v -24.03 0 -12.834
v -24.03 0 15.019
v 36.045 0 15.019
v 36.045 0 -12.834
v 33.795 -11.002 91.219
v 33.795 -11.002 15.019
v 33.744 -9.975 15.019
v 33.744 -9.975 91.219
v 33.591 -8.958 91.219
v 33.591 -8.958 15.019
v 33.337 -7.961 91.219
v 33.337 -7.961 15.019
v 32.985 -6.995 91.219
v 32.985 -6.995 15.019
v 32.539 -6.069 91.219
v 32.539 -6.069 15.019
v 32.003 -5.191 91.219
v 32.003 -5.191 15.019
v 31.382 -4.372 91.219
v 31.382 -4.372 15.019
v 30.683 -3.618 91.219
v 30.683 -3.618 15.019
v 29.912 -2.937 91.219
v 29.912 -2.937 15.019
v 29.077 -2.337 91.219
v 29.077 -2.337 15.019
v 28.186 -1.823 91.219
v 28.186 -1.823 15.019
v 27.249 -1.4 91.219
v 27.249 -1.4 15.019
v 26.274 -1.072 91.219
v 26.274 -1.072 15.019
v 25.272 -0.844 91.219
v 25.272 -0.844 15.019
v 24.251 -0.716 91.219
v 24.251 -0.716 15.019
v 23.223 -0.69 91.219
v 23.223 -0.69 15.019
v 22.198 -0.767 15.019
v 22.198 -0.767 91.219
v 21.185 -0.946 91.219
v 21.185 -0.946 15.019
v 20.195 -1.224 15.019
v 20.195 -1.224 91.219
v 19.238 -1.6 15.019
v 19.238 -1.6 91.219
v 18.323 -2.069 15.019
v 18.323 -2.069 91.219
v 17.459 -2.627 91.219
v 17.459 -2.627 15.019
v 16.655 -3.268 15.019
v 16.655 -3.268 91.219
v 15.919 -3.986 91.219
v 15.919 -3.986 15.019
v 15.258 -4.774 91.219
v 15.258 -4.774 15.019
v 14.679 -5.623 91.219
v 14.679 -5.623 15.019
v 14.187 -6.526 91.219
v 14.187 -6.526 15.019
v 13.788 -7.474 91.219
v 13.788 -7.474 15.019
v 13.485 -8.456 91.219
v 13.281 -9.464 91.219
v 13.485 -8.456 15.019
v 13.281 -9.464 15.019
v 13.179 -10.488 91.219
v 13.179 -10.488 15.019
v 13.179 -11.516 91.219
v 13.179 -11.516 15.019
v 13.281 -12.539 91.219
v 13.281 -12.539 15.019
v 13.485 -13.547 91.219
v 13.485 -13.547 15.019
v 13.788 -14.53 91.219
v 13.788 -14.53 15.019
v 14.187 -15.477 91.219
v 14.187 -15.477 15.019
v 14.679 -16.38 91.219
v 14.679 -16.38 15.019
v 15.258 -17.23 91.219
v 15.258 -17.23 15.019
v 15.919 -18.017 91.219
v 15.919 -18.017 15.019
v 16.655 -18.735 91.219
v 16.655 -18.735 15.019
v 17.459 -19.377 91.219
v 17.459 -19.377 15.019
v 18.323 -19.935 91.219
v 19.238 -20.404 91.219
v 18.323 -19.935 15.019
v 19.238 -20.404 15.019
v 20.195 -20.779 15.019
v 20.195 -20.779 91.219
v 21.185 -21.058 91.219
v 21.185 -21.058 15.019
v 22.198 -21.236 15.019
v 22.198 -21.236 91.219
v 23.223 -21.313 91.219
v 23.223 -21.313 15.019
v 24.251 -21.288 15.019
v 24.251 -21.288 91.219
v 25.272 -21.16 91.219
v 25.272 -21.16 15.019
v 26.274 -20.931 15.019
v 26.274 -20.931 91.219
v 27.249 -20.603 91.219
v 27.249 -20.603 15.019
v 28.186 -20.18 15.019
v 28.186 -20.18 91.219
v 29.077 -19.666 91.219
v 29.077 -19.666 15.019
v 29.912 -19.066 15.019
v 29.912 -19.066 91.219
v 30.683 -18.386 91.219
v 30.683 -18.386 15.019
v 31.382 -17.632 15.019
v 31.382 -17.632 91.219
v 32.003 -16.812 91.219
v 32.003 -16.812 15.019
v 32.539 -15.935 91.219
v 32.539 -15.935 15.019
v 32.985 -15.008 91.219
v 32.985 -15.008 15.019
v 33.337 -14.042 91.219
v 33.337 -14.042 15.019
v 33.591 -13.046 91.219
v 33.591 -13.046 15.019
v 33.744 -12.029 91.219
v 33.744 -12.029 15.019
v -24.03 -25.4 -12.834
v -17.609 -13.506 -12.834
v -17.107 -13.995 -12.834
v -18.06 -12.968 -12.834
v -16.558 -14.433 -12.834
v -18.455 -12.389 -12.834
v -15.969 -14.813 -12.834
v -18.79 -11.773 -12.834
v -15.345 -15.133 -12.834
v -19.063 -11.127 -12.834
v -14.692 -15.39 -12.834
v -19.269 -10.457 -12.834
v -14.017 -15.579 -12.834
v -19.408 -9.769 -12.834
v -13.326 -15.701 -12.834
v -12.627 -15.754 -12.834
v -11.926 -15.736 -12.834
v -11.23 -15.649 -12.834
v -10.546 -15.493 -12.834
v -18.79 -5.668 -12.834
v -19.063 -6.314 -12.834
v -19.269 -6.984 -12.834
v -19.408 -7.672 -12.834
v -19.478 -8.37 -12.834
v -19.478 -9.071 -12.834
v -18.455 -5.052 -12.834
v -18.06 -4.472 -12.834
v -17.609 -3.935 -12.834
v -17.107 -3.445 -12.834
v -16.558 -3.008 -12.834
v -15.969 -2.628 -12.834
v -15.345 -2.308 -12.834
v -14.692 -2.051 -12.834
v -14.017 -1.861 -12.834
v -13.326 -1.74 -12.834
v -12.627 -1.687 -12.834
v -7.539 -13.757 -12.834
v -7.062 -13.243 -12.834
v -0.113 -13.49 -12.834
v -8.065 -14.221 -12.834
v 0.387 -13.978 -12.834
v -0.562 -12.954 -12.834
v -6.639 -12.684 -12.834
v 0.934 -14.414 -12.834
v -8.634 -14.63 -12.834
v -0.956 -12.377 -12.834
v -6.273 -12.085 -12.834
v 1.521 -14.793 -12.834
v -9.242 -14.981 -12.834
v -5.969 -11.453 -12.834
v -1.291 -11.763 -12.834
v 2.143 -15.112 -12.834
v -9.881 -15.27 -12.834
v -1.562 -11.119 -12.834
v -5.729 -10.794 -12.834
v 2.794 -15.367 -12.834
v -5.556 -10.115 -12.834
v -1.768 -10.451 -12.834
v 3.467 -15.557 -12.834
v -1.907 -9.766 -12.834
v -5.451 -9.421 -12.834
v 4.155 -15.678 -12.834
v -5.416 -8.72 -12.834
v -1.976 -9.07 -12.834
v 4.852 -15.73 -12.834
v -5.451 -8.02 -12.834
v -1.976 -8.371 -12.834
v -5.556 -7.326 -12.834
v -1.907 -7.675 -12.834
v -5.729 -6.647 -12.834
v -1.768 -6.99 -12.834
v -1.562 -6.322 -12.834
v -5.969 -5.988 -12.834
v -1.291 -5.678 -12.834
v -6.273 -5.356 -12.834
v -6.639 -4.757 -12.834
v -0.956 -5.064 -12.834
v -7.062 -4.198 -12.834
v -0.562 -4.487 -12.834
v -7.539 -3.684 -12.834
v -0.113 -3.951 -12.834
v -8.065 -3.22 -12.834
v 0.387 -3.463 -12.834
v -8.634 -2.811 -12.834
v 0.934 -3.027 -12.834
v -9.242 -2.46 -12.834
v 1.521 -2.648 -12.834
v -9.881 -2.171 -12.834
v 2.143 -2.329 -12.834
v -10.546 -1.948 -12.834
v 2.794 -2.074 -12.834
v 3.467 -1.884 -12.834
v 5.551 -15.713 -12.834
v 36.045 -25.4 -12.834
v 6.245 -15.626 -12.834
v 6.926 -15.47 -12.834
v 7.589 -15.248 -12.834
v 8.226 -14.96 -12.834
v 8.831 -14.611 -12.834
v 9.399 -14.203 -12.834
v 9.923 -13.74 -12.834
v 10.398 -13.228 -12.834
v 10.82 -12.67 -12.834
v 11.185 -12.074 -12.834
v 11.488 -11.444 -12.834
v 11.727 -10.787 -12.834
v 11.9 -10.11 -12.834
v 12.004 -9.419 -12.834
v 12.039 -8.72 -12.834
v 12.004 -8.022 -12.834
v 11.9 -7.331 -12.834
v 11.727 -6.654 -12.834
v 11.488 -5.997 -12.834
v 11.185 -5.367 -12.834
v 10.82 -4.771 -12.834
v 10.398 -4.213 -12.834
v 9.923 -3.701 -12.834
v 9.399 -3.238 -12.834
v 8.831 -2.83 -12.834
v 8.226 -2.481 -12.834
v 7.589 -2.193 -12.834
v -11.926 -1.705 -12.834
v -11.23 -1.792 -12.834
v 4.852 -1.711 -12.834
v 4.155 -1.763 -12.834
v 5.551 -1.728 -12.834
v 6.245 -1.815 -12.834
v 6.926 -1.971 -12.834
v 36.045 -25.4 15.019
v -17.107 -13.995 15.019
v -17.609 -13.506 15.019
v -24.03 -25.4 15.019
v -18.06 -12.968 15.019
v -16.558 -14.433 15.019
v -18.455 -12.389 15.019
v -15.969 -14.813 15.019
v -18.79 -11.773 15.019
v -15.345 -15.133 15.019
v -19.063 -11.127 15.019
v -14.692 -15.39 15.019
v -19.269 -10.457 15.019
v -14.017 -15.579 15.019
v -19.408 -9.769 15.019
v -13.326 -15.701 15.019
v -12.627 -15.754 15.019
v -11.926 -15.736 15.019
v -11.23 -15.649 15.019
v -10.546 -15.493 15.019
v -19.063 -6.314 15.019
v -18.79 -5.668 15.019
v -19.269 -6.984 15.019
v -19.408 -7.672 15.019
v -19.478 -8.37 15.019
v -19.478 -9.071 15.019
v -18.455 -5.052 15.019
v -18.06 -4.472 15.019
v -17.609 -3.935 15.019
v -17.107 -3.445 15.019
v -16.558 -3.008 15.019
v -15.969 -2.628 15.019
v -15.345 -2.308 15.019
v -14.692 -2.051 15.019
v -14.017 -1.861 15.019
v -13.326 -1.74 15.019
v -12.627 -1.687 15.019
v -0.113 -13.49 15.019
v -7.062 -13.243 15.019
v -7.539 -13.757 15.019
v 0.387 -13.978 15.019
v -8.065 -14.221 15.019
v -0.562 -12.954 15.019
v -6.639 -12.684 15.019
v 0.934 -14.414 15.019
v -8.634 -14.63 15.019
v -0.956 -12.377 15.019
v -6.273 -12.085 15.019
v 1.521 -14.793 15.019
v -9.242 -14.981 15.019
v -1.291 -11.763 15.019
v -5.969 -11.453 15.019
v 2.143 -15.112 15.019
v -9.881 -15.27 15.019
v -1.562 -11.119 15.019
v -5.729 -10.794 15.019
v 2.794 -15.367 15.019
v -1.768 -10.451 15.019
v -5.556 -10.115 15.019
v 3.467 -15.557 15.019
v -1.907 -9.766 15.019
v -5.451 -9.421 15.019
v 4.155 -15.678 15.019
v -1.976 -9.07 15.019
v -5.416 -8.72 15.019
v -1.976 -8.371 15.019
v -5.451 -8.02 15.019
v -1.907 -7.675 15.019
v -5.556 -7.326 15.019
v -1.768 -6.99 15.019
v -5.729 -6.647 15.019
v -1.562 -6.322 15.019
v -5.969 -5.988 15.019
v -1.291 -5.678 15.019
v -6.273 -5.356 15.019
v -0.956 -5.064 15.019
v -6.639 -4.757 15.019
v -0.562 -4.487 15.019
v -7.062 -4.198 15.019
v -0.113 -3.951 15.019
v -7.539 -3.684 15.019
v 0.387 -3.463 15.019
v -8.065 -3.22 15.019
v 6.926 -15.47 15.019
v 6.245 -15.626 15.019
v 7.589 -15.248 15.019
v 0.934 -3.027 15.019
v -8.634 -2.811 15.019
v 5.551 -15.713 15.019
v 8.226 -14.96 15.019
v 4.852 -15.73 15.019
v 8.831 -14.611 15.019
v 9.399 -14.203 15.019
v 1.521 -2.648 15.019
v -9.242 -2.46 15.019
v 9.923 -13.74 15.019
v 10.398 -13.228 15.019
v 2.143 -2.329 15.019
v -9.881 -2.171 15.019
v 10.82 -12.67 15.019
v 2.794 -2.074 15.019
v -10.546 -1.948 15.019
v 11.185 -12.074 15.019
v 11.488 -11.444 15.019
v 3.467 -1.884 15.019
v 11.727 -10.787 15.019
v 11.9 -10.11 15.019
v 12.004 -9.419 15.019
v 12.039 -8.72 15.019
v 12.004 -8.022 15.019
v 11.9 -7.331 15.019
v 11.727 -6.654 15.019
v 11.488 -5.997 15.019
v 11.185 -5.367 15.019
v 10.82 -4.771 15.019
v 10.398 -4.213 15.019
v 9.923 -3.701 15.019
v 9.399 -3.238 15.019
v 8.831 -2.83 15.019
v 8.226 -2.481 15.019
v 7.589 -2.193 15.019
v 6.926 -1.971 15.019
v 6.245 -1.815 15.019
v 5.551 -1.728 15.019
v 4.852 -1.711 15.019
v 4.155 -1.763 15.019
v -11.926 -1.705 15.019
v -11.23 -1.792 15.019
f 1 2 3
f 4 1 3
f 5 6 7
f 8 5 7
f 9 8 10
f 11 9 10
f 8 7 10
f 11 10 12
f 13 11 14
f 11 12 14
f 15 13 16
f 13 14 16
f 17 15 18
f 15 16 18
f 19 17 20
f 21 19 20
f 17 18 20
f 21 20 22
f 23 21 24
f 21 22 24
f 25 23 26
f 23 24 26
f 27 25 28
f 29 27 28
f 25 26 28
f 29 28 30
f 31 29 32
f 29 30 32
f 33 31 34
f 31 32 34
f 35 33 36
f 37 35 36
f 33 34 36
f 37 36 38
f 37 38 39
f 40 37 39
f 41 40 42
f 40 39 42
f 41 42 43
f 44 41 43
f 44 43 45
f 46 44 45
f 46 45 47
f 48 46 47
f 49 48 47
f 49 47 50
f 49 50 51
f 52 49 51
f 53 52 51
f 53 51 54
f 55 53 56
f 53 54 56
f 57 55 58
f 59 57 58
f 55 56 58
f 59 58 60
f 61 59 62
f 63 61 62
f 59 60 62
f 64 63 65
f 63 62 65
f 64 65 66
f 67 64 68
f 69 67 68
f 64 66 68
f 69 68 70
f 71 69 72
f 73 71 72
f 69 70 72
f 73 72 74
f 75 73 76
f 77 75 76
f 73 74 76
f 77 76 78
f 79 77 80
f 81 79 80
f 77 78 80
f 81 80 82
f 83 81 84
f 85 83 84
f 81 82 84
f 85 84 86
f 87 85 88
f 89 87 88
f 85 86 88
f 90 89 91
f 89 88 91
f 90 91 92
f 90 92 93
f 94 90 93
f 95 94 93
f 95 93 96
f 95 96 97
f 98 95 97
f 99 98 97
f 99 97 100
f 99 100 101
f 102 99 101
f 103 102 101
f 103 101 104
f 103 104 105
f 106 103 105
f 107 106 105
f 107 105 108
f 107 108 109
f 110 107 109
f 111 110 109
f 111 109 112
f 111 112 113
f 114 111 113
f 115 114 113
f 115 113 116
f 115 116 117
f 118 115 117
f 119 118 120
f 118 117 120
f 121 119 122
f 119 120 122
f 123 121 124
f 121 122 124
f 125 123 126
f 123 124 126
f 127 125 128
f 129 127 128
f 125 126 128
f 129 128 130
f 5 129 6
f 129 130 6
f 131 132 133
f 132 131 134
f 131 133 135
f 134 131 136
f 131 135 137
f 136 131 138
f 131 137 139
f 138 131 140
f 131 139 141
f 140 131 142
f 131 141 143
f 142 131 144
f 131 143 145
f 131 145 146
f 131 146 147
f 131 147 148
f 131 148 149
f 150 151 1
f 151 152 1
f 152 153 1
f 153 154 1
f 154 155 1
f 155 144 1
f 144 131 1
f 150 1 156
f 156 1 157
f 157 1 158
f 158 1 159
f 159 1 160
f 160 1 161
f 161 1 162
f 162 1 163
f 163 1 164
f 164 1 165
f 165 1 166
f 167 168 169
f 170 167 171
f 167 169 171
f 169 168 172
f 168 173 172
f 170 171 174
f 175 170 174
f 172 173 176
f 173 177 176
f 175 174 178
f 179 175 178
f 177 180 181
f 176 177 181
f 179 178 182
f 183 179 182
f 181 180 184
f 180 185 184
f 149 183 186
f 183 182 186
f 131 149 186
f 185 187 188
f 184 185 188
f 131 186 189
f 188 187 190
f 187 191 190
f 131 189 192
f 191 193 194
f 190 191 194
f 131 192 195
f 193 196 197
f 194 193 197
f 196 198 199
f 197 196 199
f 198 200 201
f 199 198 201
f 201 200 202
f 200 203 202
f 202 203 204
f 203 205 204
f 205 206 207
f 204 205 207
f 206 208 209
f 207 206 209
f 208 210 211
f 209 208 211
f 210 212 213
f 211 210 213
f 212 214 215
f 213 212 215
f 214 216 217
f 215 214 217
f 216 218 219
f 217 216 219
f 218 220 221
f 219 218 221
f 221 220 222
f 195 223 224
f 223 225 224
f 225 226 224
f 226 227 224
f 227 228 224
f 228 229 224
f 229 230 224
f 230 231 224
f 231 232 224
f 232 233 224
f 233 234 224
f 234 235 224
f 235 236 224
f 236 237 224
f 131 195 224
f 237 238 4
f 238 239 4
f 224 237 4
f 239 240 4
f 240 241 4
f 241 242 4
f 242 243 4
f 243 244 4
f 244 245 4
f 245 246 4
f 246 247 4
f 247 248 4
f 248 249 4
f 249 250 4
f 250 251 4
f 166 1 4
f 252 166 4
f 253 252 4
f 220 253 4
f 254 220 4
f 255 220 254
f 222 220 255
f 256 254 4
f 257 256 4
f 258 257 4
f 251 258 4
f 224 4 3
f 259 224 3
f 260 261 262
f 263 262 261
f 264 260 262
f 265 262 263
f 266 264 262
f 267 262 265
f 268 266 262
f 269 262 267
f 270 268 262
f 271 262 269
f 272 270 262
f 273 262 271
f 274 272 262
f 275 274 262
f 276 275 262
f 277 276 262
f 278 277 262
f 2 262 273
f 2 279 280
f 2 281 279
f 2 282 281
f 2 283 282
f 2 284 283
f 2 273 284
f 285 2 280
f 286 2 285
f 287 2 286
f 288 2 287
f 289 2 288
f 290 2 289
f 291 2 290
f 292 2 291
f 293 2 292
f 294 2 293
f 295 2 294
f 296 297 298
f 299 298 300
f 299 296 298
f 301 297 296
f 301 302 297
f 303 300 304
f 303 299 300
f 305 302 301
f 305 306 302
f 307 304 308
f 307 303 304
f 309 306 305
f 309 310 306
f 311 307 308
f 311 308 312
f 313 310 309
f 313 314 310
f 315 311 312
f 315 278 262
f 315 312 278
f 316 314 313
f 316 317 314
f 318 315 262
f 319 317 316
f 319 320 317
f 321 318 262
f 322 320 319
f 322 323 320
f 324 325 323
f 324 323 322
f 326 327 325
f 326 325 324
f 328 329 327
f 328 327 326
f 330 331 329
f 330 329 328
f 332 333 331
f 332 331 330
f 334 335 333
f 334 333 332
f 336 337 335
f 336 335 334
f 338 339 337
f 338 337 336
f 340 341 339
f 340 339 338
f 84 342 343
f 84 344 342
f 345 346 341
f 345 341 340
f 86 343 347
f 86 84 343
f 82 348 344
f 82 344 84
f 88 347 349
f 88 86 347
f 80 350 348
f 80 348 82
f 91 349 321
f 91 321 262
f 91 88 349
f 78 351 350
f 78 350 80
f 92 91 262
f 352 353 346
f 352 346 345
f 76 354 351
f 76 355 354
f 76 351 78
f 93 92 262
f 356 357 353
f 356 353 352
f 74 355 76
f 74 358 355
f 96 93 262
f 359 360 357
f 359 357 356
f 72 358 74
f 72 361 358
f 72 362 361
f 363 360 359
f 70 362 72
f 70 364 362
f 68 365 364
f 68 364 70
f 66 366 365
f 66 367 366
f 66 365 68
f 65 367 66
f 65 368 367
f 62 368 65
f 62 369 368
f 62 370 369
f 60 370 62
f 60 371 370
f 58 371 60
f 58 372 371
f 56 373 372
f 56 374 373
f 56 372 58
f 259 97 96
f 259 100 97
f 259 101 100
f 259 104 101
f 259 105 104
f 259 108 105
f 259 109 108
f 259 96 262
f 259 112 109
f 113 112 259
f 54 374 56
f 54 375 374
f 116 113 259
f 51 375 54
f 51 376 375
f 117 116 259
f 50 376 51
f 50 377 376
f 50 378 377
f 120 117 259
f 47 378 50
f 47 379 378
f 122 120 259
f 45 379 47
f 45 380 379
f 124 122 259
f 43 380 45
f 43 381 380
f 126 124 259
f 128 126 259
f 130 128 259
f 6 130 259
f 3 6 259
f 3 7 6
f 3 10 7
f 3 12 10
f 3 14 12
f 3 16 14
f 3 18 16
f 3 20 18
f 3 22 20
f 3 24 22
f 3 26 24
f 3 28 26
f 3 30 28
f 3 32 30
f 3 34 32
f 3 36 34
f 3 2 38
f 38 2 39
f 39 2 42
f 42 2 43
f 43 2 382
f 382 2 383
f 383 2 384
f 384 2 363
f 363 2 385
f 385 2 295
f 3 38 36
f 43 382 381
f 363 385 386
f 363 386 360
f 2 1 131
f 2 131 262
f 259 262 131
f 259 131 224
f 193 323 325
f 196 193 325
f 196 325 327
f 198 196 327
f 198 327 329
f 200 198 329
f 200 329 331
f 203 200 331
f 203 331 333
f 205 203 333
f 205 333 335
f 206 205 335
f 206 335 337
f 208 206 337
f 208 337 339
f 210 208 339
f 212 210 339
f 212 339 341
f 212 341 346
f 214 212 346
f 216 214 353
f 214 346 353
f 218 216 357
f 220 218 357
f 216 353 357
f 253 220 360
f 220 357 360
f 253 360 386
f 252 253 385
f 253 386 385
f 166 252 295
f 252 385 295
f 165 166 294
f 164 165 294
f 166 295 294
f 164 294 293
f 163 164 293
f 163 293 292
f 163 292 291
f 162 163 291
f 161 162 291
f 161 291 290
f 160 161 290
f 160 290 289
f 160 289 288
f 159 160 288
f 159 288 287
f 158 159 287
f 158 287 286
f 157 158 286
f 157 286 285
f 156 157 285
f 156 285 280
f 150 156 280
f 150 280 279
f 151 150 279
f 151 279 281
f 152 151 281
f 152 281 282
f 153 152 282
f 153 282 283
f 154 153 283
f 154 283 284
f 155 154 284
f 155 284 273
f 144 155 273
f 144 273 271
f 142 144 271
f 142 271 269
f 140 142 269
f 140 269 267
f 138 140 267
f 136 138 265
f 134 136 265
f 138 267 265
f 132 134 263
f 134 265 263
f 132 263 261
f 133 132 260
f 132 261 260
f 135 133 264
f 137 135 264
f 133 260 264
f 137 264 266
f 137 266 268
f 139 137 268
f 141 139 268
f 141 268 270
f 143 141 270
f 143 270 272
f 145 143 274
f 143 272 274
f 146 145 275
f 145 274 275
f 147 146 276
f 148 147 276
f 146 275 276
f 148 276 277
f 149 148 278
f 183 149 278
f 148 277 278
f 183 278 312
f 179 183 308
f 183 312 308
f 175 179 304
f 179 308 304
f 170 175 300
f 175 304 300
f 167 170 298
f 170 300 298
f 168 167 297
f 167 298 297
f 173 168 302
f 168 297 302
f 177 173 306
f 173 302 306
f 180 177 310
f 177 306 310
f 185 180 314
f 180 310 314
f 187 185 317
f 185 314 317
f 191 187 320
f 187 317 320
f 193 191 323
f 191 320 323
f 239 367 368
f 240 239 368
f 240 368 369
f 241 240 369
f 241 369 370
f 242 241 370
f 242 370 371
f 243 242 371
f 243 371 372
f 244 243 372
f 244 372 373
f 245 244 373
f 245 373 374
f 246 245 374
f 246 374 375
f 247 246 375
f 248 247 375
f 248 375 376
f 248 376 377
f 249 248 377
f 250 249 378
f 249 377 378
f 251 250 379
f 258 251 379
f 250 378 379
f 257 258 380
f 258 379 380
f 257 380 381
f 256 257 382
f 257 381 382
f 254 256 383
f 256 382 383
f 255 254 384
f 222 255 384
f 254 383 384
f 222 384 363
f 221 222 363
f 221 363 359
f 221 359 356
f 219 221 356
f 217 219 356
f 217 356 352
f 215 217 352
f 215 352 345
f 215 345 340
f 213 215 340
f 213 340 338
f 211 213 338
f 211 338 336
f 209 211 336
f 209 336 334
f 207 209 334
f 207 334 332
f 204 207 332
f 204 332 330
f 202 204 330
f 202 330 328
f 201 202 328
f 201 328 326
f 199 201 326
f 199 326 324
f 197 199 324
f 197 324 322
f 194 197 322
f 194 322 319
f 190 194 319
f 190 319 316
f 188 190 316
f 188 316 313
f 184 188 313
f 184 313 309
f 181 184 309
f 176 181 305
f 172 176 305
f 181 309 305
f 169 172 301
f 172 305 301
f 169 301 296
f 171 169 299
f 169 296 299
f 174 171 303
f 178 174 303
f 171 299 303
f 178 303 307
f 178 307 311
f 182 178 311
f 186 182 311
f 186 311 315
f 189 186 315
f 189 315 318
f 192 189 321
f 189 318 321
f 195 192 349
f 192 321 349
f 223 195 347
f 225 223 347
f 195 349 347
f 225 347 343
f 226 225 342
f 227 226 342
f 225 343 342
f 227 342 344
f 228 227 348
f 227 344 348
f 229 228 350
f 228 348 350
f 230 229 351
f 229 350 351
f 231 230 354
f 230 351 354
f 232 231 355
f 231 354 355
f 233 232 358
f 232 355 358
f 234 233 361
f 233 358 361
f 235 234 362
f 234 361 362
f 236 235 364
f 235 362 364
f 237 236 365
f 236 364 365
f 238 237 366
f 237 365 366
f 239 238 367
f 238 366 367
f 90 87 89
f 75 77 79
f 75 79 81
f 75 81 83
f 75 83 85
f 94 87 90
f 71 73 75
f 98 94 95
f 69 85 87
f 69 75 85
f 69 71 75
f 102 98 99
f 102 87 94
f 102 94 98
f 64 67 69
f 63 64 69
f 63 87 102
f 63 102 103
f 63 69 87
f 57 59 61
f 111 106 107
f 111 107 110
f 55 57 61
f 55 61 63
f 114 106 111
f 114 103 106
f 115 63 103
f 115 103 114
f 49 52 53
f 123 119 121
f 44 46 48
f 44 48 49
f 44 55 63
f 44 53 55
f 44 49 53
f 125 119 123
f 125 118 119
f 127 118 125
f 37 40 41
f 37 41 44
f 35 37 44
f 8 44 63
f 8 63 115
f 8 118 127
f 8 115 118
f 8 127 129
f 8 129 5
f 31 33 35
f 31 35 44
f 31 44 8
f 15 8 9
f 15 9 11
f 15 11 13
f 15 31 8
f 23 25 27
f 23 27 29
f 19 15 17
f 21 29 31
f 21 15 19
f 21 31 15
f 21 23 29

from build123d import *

# Parameters (mm, degrees)
F0_W     = 60.075765
F0_H     = 27.85331
F1_DEPTH = 25.4
F2_R     = 7.011895
F2_R_2   = 7.03539
F3_DEPTH = 50.8
F4_R     = 10.314732
F5_DEPTH = 76.2


with BuildPart() as f1:
    # F0 (on Front) → F1 (new body)
    with BuildSketch(Plane.XZ):
        with Locations((6.007575, 1.092287)):
            Rectangle(F0_W, F0_H)
    extrude(amount=F1_DEPTH)

    # F2 (on face) → F3 (cut)
    with BuildSketch(Plane.XY.offset(15.018942)):
        with Locations((5.026927, -8.720485)):
            Circle(F2_R)
        with Locations((-12.451476, -8.720485)):
            Circle(F2_R_2)
    extrude(amount=-F3_DEPTH, mode=Mode.SUBTRACT)

    # F4 (on face) → F5 (join)
    with BuildSketch(Plane.XY.offset(15.018942)):
        with Locations((23.480423, -11.001698)):
            Circle(F4_R)
    extrude(amount=F5_DEPTH)


solid = f1.part
